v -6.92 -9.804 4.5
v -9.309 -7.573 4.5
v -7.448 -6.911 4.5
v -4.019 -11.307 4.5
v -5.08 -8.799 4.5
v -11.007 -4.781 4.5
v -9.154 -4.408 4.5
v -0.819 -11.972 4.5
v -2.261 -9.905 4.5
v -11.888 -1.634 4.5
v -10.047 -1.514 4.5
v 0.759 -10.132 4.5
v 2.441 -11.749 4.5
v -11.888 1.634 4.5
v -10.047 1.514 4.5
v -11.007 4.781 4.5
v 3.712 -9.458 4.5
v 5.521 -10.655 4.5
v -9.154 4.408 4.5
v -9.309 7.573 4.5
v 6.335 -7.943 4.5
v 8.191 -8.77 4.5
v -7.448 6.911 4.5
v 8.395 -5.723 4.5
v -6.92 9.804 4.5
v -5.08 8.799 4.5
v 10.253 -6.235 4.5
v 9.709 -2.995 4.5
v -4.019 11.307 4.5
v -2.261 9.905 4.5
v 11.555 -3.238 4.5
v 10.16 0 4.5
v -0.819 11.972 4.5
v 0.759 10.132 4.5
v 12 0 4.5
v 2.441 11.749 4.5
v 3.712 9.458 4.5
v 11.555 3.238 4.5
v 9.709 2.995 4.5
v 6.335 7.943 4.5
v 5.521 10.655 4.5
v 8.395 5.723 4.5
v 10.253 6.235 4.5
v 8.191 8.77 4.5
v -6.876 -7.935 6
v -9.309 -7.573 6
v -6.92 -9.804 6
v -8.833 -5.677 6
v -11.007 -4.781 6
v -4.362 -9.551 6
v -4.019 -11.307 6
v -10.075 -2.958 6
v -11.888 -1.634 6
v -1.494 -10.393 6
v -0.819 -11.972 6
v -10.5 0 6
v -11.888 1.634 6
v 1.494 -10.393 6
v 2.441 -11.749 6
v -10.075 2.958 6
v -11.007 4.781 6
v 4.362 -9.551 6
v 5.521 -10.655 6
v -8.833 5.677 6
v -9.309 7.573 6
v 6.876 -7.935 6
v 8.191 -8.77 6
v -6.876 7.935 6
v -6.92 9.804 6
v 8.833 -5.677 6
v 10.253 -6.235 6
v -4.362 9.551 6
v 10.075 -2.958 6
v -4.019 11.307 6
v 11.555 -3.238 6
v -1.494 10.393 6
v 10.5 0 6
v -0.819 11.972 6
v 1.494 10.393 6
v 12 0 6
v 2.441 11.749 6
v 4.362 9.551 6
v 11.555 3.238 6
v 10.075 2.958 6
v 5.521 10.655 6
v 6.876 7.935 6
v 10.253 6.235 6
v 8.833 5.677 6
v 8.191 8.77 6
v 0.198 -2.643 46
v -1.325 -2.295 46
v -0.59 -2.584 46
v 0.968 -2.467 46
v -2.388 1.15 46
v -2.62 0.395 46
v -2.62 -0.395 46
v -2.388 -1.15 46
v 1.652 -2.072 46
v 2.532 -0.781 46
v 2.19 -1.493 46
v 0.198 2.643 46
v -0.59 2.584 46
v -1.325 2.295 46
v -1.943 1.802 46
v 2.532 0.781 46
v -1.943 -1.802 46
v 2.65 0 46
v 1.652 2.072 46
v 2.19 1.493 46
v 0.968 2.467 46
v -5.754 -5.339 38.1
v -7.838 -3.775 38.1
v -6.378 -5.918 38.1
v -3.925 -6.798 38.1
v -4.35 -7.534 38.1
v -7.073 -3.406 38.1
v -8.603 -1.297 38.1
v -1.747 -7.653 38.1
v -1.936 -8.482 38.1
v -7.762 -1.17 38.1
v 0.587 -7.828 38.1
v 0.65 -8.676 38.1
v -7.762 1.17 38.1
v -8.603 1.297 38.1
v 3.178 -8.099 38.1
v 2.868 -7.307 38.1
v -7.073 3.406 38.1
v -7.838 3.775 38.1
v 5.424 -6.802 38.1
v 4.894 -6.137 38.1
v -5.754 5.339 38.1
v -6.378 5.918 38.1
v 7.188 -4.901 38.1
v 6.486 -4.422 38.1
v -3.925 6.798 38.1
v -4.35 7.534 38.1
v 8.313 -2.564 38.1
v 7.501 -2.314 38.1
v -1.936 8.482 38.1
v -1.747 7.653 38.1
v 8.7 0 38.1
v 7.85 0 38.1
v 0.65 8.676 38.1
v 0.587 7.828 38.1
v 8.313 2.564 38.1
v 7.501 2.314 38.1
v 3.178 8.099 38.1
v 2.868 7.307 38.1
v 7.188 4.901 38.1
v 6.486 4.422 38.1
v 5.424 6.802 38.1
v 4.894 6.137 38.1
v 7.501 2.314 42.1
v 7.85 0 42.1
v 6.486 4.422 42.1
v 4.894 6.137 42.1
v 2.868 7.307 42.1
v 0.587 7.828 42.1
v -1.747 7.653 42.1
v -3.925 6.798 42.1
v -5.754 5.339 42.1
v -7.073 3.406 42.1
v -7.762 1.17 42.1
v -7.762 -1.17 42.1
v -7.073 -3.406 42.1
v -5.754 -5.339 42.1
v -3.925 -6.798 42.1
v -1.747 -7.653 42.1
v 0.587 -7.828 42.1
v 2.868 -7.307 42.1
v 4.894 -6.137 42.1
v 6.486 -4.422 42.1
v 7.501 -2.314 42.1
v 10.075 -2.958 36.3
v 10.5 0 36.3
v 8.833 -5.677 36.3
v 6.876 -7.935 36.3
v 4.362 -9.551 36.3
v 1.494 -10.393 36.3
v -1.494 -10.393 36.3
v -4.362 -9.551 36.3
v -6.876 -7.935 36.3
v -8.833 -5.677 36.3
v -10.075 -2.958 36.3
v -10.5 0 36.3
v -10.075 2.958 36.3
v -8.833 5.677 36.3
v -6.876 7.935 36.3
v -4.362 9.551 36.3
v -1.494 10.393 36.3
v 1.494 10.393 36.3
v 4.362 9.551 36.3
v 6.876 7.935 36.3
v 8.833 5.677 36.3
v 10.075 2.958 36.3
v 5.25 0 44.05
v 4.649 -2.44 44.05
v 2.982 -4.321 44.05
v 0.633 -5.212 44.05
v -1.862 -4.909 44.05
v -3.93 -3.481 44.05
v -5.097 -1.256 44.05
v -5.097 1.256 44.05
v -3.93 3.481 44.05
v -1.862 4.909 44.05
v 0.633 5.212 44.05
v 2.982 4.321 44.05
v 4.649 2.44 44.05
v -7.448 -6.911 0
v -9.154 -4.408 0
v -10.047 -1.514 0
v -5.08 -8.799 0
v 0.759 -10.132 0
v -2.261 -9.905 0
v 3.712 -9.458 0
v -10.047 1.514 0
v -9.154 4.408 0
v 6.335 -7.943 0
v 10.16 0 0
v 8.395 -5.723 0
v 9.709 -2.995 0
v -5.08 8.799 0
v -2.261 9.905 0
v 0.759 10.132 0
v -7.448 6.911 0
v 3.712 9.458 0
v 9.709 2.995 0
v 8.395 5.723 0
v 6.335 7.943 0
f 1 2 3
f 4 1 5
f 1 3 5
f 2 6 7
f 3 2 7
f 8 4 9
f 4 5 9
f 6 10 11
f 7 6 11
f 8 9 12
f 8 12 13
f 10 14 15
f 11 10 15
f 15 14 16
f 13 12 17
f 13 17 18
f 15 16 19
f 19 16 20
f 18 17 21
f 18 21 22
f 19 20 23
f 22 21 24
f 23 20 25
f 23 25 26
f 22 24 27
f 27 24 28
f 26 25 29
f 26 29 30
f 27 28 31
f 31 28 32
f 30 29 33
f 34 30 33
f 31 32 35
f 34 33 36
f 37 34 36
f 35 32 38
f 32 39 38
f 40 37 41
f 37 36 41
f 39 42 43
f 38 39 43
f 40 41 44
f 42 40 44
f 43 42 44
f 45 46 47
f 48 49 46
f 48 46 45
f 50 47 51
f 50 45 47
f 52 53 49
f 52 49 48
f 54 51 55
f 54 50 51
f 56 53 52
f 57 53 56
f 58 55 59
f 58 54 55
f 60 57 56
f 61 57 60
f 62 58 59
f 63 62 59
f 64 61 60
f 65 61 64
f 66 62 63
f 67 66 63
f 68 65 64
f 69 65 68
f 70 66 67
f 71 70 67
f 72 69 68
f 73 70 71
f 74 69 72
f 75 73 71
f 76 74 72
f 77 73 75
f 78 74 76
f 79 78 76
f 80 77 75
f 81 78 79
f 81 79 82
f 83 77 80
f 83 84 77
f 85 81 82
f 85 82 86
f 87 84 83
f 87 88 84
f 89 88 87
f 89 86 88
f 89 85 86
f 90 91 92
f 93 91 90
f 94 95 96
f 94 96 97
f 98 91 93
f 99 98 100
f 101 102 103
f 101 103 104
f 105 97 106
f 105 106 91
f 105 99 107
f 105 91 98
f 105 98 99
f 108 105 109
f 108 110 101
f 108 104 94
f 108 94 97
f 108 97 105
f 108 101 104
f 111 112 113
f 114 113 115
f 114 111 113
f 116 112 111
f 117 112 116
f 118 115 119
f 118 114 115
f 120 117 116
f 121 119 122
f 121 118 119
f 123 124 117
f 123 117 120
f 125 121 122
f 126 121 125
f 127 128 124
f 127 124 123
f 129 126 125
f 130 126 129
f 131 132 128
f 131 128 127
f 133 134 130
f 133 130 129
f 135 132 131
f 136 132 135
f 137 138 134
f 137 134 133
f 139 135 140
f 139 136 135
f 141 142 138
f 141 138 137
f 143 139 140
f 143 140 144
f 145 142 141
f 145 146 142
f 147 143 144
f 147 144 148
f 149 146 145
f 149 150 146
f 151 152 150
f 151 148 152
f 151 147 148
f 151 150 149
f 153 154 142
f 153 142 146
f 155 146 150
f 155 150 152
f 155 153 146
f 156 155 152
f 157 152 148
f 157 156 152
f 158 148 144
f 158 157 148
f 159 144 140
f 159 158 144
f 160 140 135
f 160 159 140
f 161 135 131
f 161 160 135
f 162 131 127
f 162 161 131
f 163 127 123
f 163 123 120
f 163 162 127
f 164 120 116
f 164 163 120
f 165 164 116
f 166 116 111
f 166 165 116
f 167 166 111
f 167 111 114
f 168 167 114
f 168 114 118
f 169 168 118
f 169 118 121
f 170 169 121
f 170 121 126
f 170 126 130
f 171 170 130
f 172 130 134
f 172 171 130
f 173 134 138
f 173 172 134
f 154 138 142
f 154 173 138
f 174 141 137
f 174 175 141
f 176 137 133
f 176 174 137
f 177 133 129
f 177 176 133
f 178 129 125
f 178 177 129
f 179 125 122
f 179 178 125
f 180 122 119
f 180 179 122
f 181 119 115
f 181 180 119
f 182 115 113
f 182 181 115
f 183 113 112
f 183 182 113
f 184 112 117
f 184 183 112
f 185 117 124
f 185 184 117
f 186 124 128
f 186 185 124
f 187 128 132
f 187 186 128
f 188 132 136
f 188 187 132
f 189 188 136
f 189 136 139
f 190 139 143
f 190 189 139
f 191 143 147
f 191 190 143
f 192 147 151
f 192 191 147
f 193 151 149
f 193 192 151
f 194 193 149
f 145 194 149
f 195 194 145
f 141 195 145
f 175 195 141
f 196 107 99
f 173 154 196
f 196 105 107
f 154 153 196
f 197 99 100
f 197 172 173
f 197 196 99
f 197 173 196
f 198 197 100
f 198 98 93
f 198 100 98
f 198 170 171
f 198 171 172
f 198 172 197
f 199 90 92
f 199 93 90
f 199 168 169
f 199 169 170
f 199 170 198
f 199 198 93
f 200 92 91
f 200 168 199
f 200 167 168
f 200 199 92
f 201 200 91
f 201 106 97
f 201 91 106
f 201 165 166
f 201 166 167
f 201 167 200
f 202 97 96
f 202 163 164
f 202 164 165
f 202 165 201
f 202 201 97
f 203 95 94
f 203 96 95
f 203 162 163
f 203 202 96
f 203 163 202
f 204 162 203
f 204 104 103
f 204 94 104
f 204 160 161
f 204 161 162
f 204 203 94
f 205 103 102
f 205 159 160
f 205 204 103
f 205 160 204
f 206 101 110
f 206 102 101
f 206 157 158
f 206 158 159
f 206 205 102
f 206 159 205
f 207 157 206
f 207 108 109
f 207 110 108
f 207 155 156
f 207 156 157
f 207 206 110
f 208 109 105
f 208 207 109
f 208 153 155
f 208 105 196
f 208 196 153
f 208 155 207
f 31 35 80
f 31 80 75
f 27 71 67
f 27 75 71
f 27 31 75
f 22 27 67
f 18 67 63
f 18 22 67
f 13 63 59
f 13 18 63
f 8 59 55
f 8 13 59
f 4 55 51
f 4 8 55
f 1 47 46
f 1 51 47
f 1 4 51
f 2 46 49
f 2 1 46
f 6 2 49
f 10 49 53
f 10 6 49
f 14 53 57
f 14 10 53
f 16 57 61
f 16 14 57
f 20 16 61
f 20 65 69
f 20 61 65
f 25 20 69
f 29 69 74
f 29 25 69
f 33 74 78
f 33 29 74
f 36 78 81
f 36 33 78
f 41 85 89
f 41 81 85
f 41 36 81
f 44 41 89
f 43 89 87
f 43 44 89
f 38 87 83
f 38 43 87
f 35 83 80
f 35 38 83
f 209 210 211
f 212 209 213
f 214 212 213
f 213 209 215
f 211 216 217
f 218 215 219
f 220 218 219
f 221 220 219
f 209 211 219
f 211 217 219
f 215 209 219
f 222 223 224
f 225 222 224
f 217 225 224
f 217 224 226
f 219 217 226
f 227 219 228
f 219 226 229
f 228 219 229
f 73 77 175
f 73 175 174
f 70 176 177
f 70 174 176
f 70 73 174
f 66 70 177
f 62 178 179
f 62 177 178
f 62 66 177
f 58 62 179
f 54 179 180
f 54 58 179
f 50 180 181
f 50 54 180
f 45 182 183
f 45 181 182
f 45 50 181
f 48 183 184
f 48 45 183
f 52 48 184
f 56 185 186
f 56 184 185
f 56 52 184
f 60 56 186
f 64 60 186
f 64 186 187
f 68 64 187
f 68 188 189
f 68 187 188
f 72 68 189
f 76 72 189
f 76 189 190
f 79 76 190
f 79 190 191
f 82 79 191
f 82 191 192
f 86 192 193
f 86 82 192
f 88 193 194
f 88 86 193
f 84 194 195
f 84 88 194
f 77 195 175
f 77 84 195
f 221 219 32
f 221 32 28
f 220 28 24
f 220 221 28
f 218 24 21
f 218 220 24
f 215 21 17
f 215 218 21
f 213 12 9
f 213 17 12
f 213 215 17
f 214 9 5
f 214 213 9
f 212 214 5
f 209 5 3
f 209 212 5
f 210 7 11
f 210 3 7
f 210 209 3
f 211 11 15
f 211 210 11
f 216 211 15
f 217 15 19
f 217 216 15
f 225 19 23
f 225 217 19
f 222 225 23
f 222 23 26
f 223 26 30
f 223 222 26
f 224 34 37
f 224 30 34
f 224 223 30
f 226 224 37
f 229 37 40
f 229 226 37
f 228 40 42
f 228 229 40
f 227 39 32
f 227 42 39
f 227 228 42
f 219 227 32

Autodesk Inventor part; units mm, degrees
ref_plane "YZ Plane" through (0, 0, 0) normal (1, 0, 0) x (0, 1, 0)
ref_plane "XZ Plane" through (0, 0, 0) normal (0, 1, 0) x (-1, 0, 0)
ref_plane "XY Plane" through (0, 0, 0) normal (0, 0, 1) x (1, 0, 0)
sketch "Sketch1" plane through (0, 0, 0) normal (0, 0, 1) x (1, 0, 0)
  circle A0 centre (0, 0) radius 10.16
  dimension "d0" = 20.32
extrude "Extrusion1" add sketch "Sketch1" along normal blind 4.5
sketch "Sketch2" plane through (0, 0, 4.5) normal (0, 0, 1) x (1, 0, 0)
  circle A0 centre (0, 0) radius 12
  dimension "d3" = 24
extrude "Extrusion2" add sketch "Sketch2" along normal blind 1.5
sketch "Sketch3" plane through (0, 0, 6) normal (0, 0, 1) x (1, 0, 0)
  circle A0 centre (0, 0) radius 10.5
  dimension "d6" = 21
extrude "Extrusion3" add sketch "Sketch3" along normal blind 40
sketch "Sketch5" plane through (0, 0, 46) normal (0, 0, 1) x (1, 0, 0)
  point P0 (0, 0)
sketch "Sketch6" plane through (0, 0, 46) normal (0, 0, 1) x (1, 0, 0)
  circle A0 centre (0, 0) radius 7.85
  circle A1 centre (0, 0) radius 10.5
  dimension "d25" = 15.7
  dimension "d26" = 21
extrude "Extrusion5" cut sketch "Sketch6" against normal blind 7.9
chamfer "Chamfer5" distance 1.8 angle 45 1 edges at (-10.5, 0, 38.1)
chamfer "Chamfer6" distance 5.2 distance2 3.9 1 edges at (-7.85, 0, 46) measured on face at (-0.2971, -2.4466, 46)
properties part number "objective"
